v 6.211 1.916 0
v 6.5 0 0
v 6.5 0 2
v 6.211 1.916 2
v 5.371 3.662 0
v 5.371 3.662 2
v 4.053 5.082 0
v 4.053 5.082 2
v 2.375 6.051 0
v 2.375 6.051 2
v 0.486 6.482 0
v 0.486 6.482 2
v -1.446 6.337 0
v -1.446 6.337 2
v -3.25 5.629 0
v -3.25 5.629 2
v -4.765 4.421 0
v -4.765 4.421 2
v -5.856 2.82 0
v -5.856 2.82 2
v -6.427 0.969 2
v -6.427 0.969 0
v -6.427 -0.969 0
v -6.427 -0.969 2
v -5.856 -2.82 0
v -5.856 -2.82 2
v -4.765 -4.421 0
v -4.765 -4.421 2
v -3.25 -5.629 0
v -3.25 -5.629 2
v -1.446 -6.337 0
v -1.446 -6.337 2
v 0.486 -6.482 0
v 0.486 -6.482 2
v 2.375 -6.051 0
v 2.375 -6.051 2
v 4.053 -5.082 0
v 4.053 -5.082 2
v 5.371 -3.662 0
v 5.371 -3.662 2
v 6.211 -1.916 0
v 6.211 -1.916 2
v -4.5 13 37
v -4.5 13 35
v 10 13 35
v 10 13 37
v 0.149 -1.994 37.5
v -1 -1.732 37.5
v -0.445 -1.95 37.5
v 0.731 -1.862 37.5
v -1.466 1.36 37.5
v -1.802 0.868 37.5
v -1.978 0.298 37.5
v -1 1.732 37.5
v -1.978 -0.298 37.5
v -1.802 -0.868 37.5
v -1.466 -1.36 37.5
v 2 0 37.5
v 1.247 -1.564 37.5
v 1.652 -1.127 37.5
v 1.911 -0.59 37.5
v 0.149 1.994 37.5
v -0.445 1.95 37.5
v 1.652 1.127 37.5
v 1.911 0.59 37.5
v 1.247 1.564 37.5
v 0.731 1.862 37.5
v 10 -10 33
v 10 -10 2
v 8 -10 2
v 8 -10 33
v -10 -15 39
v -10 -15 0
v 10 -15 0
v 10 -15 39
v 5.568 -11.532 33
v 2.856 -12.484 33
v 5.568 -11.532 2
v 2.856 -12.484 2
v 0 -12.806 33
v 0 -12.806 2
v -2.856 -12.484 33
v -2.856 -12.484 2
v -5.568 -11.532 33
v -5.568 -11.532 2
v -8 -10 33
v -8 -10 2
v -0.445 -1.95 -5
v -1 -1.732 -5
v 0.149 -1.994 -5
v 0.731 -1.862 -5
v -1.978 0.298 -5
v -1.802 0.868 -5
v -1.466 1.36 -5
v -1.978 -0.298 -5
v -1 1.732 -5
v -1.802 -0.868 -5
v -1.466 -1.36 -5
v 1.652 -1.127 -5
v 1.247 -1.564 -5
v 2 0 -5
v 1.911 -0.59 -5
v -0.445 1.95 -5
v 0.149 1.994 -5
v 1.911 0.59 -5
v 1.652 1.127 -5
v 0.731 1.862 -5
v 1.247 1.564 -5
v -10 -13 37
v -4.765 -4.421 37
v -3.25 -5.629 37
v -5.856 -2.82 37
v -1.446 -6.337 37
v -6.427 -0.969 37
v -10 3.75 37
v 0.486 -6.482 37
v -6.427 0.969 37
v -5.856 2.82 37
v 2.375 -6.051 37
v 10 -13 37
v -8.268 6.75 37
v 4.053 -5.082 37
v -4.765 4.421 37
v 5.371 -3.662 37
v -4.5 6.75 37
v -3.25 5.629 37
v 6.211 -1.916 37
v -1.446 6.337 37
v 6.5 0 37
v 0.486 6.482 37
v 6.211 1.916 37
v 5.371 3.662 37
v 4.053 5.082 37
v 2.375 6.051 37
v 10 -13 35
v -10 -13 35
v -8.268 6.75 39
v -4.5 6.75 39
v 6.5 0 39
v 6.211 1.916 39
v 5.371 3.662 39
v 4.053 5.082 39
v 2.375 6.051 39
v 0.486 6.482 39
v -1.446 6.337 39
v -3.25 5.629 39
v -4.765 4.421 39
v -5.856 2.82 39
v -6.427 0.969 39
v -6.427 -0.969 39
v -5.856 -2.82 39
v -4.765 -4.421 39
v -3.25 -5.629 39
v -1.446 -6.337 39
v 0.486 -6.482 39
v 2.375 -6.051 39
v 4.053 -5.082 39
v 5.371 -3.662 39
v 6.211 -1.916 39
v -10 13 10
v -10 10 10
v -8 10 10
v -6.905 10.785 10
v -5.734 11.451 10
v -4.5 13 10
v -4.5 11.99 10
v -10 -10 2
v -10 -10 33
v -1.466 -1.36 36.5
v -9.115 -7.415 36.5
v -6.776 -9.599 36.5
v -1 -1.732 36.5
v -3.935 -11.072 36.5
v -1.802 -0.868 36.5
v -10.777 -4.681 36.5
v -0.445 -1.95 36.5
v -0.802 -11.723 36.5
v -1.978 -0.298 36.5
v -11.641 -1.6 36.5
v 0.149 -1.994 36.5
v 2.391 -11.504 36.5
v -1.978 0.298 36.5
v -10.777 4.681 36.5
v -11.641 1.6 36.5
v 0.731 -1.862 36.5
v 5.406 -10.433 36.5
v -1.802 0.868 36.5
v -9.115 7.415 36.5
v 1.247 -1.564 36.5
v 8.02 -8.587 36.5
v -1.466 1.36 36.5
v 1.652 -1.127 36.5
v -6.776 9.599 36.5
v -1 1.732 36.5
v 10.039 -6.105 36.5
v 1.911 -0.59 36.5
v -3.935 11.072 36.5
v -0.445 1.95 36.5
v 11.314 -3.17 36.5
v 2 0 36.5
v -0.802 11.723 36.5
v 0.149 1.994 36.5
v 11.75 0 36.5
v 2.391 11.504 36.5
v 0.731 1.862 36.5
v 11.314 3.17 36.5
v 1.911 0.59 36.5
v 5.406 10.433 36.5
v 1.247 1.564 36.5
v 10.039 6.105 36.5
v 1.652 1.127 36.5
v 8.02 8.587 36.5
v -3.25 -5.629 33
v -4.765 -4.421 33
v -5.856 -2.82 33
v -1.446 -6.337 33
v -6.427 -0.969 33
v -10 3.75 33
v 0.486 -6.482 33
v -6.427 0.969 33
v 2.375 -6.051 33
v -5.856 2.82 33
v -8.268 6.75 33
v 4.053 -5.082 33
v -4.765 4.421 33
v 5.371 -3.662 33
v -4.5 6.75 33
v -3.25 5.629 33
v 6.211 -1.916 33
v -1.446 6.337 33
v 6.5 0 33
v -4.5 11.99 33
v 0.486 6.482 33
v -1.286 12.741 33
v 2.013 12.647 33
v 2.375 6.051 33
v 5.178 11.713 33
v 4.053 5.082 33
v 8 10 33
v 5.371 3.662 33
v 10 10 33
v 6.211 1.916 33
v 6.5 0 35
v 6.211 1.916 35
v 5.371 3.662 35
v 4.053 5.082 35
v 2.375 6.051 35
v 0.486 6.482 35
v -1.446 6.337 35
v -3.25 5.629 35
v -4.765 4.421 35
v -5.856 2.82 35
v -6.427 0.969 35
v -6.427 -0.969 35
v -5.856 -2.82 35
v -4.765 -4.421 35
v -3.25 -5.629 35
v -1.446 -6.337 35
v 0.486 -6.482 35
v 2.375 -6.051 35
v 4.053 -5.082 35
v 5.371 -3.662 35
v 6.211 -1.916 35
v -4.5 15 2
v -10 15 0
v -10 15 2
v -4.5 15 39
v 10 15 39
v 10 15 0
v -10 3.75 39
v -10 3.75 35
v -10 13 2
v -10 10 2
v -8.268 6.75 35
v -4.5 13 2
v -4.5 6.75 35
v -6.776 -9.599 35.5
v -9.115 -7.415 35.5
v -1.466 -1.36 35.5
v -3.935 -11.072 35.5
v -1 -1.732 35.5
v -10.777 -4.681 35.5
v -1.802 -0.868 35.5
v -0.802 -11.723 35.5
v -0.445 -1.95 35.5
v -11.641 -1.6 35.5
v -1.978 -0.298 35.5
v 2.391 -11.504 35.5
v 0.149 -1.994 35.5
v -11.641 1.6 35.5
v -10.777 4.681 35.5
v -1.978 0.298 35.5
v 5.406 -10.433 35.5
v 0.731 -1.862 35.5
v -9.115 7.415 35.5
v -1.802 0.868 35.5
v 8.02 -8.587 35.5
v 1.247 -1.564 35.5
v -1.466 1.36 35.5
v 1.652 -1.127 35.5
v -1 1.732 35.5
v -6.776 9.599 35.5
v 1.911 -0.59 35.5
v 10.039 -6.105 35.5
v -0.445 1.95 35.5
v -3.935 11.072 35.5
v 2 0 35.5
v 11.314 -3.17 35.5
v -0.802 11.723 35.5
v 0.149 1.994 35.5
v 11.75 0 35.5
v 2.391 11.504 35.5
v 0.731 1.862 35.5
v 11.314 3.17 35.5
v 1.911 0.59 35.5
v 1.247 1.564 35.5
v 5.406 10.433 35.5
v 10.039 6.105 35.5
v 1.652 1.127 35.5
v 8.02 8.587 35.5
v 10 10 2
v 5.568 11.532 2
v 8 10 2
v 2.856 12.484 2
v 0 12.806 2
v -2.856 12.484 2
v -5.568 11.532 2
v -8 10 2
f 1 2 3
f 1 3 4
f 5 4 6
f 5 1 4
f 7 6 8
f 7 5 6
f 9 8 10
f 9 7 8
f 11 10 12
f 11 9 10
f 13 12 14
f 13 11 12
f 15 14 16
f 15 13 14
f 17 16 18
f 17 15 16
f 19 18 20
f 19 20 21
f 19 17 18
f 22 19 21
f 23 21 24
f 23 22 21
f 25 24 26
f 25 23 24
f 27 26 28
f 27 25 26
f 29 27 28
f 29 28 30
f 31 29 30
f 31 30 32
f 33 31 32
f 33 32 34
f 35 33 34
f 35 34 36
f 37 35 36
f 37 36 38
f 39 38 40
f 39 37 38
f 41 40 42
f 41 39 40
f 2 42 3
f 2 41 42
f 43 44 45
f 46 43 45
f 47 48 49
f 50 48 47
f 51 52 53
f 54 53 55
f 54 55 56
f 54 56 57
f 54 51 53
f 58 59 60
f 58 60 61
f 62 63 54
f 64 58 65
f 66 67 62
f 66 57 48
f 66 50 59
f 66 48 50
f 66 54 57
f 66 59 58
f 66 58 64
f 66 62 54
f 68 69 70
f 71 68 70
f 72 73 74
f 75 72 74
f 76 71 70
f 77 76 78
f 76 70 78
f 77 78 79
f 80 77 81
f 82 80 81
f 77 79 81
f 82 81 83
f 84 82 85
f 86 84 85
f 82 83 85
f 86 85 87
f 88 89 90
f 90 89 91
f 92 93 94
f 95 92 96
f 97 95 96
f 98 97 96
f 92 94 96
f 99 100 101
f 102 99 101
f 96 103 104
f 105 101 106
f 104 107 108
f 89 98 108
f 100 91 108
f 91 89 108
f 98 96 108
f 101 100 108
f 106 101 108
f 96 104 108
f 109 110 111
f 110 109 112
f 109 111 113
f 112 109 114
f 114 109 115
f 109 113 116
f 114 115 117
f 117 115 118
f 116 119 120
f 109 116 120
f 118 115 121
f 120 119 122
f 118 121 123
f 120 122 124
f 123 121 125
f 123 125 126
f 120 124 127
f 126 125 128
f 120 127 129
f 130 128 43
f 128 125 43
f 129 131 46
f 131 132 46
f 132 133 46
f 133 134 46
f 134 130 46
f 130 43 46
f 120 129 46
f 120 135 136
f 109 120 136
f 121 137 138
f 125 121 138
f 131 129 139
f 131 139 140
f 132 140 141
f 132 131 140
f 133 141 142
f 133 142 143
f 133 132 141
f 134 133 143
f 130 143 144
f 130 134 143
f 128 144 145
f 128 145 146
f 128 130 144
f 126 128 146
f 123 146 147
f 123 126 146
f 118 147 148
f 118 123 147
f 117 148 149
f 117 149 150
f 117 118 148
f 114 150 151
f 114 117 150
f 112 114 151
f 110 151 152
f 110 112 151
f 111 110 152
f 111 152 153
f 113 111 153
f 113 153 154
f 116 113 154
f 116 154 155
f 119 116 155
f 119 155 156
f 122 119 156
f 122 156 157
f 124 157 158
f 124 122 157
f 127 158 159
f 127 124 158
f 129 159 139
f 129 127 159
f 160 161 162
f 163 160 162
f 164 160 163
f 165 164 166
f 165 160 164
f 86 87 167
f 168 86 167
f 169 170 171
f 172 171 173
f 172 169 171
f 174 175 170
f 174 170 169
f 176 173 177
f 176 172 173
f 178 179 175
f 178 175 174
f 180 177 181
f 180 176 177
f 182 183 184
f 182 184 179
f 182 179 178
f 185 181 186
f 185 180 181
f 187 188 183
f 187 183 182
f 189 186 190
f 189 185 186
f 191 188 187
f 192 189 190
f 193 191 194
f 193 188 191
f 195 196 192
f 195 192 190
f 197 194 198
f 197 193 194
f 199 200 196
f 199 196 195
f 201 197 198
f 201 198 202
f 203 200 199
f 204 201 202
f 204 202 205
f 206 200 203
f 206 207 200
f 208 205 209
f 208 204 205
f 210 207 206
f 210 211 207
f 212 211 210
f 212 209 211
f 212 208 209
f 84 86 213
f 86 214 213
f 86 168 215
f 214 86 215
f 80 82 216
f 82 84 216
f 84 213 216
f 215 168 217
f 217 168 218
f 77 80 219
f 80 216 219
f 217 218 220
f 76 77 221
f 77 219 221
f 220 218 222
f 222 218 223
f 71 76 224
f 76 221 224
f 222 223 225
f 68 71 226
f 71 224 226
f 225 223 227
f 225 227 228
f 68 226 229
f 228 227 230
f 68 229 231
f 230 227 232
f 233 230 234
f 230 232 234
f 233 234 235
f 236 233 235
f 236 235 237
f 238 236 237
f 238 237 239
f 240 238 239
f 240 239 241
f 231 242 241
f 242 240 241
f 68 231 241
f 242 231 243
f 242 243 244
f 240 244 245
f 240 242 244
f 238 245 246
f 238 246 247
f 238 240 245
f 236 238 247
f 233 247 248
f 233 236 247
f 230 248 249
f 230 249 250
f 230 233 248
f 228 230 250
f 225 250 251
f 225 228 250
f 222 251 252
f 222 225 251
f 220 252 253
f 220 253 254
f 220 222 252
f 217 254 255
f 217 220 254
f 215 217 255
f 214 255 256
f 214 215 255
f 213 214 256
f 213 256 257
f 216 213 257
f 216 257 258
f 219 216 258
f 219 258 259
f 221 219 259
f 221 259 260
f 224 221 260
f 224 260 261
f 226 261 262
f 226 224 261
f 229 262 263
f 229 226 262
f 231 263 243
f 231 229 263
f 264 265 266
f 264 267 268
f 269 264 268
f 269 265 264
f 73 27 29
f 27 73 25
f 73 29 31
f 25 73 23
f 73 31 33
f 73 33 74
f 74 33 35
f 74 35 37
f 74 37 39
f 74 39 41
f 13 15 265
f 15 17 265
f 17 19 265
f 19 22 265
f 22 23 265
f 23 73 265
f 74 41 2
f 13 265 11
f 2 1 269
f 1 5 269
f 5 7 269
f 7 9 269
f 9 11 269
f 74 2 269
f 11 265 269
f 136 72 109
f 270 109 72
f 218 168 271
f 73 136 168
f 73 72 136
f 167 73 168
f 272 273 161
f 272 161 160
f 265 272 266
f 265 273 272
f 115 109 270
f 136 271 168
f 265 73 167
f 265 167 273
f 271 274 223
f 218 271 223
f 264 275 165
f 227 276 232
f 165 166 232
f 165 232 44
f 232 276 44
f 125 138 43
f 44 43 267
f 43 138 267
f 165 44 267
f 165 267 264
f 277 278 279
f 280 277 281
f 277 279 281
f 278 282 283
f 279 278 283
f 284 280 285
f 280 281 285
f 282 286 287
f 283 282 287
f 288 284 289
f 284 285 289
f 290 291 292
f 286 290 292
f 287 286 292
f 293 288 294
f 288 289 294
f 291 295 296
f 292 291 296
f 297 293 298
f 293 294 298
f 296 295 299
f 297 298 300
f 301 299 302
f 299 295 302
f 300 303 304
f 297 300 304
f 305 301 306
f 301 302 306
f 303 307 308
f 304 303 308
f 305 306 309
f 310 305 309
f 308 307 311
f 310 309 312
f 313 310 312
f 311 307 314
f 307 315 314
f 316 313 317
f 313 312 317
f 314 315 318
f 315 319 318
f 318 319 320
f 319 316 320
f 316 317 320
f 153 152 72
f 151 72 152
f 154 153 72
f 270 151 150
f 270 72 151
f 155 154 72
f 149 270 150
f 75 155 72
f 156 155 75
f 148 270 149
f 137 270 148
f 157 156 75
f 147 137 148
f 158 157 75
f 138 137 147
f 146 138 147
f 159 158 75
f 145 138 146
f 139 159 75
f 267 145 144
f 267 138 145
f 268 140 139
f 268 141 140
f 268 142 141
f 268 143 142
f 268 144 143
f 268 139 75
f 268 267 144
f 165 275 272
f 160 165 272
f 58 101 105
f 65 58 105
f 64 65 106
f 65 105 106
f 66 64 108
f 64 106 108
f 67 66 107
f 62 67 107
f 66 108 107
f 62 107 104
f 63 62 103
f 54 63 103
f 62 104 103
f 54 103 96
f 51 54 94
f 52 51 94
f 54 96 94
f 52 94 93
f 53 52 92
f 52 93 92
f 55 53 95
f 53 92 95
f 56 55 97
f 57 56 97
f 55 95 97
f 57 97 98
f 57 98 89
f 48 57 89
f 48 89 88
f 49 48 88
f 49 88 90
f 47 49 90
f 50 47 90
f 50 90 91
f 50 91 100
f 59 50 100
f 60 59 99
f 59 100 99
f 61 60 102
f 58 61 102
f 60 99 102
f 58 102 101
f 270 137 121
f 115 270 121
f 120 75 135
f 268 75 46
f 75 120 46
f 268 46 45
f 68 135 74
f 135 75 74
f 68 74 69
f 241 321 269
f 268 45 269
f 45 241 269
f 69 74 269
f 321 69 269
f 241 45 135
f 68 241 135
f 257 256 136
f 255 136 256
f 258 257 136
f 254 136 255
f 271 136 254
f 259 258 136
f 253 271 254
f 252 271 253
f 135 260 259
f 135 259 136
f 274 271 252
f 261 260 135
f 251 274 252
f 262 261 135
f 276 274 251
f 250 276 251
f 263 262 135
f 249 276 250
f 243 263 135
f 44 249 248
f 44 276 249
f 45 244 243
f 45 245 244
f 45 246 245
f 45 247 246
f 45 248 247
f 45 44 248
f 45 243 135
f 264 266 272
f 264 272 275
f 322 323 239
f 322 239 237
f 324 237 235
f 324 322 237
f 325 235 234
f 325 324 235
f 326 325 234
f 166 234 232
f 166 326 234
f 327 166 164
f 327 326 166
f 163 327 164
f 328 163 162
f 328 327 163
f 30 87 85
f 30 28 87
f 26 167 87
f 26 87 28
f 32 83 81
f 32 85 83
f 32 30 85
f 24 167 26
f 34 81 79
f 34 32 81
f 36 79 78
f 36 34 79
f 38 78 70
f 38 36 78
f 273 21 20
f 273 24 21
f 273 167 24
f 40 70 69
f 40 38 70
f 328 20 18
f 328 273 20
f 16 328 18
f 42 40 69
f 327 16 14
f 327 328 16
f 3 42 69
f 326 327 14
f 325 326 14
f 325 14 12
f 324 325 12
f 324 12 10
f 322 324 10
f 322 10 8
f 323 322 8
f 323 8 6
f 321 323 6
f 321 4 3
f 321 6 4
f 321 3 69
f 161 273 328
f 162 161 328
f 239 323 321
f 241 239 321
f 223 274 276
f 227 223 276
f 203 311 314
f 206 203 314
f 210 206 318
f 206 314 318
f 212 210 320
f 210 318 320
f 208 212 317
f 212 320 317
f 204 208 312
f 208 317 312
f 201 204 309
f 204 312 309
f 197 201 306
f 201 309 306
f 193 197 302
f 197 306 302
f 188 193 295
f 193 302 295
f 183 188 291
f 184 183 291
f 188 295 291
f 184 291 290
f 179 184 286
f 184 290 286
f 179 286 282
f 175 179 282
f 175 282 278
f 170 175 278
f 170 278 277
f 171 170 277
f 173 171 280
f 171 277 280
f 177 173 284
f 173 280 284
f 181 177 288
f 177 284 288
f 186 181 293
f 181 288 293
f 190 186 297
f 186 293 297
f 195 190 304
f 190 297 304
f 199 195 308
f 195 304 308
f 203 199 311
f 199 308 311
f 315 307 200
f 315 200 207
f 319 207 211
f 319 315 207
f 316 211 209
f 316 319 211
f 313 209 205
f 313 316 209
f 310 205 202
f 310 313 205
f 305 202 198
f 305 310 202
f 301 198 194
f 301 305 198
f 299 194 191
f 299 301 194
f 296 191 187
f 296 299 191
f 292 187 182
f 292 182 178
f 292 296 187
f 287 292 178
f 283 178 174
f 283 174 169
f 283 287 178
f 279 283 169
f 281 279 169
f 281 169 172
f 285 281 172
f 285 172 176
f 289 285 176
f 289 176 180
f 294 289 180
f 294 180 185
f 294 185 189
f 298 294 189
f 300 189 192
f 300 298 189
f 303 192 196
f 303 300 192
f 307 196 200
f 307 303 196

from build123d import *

# Parameters (mm, degrees)
SKETCH1_W                = 20
SKETCH1_H                = 30
SKETCH1_R                = 6.5
BOSS_EXTRUDE1_DEPTH      = 2
BOSS_EXTRUDE4_DEPTH      = 34
BOSS_EXTRUDE5_START      = 37
SKETCH1_9_W              = 20
SKETCH1_9_H              = 30
SKETCH1_9_R              = 6.5
BOSS_EXTRUDE5_DEPTH      = 2
BOSS_EXTRUDE6_START      = 33
SKETCH1_10_W             = 20
SKETCH1_10_H             = 30
SKETCH1_10_R             = 6.5
BOSS_EXTRUDE6_DEPTH      = 2
SKETCH1_11_W             = 20
SKETCH1_11_H             = 2
BOSS_EXTRUDE7_DEPTH      = 39
SKETCH2_W                = 5.5
SKETCH2_H                = 8.25
CUT_EXTRUDE1_DEPTH       = 37
BOSS_EXTRUDE10_DEPTH     = 10
BOSS_EXTRUDE8_START      = 35.5
SKETCH4_R                = 11.75
SKETCH4_R_2              = 2
BOSS_EXTRUDE8_DEPTH      = 1
BOSS_EXTRUDE9_DEPTH      = 37.5
BOSS_EXTRUDE9_DEPTH_BACK = 5
SKETCH4_2_R              = 2
CHAMFER3_SIZE            = 3
CHAMFER3_SIZE2           = 1.732050808


with BuildPart() as part:
    # Sketch1 → Boss-Extrude1 (new body)
    with BuildSketch(Plane.XY):
        Rectangle(SKETCH1_W, SKETCH1_H)
        Circle(SKETCH1_R, mode=Mode.SUBTRACT)
    extrude(amount=BOSS_EXTRUDE1_DEPTH)

    # Sketch1<7> → Boss-Extrude4 (add)
    with BuildSketch(Plane.XY):
        with BuildLine():
            Line((10, 15), (-10, 15))
            Line((-10, 15), (-10, 10))
            Line((-10, 10), (-8, 10))
            ThreePointArc((-8, 10), (0, 12.806248475), (8, 10))
            Line((8, 10), (10, 10))
            Line((10, 10), (10, 15))
        make_face()
        with BuildLine():
            Line((10, -10), (8, -10))
            ThreePointArc((8, -10), (0, -12.806248475), (-8, -10))
            Line((-8, -10), (-10, -10))
            Line((-10, -10), (-10, -15))
            Line((-10, -15), (10, -15))
            Line((10, -15), (10, -10))
        make_face()
    extrude(amount=BOSS_EXTRUDE4_DEPTH)

    # Sketch1<10> → Boss-Extrude6 (add)
    with BuildSketch(Plane.XY.offset(BOSS_EXTRUDE6_START)):
        Rectangle(SKETCH1_10_W, SKETCH1_10_H)
        Circle(SKETCH1_10_R, mode=Mode.SUBTRACT)
    extrude(amount=BOSS_EXTRUDE6_DEPTH)



with BuildPart() as body_2:
    # Sketch1<9> → Boss-Extrude5 (new body)
    with BuildSketch(Plane.XY.offset(BOSS_EXTRUDE5_START)):
        Rectangle(SKETCH1_9_W, SKETCH1_9_H)
        Circle(SKETCH1_9_R, mode=Mode.SUBTRACT)
    extrude(amount=BOSS_EXTRUDE5_DEPTH)


with BuildPart() as part_1:
    add(part.part)

    add(body_2.part)  # Boss-Extrude7 merges body 2
    # Sketch1<11> → Boss-Extrude7 (add)
    with BuildSketch(Plane.XY):
        with Locations((0, 14)):
            Rectangle(SKETCH1_11_W, SKETCH1_11_H)
        with Locations((0, -14)):
            Rectangle(SKETCH1_11_W, SKETCH1_11_H)
    extrude(amount=BOSS_EXTRUDE7_DEPTH)

    # Sketch2 → Cut-Extrude1 (cut)
    with BuildSketch(Plane.XY.offset(39)):
        with Locations((-7.25, 10.875)):
            Rectangle(SKETCH2_W, SKETCH2_H)
    extrude(amount=-CUT_EXTRUDE1_DEPTH, mode=Mode.SUBTRACT)

    # Sketch1<12> → Boss-Extrude10 (add)
    with BuildSketch(Plane.XY):
        with BuildLine():
            Line((-10, 13), (-10, 10))
            Line((-10, 10), (-8, 10))
            ThreePointArc((-8, 10), (0, 12.806248475), (8, 10))
            Line((8, 10), (8, 13))
            Line((8, 13), (-10, 13))
        make_face()
    extrude(amount=BOSS_EXTRUDE10_DEPTH)

    # Chamfer3
    chamfer3_edges = [part_1.edges().sort_by_distance(p)[0] for p in [
        (-10, 6.75, 34),
        (-10, 6.75, 38),
    ]]
    chamfer3_side = [part_1.faces().sort_by_distance(p)[0] for p in [
        (-10, 14, 1.507963416),
    ]]
    chamfer(chamfer3_edges, length=CHAMFER3_SIZE, length2=CHAMFER3_SIZE2, reference=chamfer3_side[0])


with BuildPart() as body_2_2:
    # Sketch4 → Boss-Extrude8 (new body)
    with BuildSketch(Plane.XY.offset(BOSS_EXTRUDE8_START)):
        Circle(SKETCH4_R)
        Circle(SKETCH4_R_2, mode=Mode.SUBTRACT)
    extrude(amount=BOSS_EXTRUDE8_DEPTH)


with BuildPart() as body_3:
    # Sketch4<2> → Boss-Extrude9 (new, two sides: drawn at the far end of the back side and taken through both)
    with BuildSketch(Plane.XY.offset(-BOSS_EXTRUDE9_DEPTH_BACK)):
        Circle(SKETCH4_2_R)
    extrude(amount=BOSS_EXTRUDE9_DEPTH + BOSS_EXTRUDE9_DEPTH_BACK)


solid = Compound([part_1.part, body_2_2.part, body_3.part])
